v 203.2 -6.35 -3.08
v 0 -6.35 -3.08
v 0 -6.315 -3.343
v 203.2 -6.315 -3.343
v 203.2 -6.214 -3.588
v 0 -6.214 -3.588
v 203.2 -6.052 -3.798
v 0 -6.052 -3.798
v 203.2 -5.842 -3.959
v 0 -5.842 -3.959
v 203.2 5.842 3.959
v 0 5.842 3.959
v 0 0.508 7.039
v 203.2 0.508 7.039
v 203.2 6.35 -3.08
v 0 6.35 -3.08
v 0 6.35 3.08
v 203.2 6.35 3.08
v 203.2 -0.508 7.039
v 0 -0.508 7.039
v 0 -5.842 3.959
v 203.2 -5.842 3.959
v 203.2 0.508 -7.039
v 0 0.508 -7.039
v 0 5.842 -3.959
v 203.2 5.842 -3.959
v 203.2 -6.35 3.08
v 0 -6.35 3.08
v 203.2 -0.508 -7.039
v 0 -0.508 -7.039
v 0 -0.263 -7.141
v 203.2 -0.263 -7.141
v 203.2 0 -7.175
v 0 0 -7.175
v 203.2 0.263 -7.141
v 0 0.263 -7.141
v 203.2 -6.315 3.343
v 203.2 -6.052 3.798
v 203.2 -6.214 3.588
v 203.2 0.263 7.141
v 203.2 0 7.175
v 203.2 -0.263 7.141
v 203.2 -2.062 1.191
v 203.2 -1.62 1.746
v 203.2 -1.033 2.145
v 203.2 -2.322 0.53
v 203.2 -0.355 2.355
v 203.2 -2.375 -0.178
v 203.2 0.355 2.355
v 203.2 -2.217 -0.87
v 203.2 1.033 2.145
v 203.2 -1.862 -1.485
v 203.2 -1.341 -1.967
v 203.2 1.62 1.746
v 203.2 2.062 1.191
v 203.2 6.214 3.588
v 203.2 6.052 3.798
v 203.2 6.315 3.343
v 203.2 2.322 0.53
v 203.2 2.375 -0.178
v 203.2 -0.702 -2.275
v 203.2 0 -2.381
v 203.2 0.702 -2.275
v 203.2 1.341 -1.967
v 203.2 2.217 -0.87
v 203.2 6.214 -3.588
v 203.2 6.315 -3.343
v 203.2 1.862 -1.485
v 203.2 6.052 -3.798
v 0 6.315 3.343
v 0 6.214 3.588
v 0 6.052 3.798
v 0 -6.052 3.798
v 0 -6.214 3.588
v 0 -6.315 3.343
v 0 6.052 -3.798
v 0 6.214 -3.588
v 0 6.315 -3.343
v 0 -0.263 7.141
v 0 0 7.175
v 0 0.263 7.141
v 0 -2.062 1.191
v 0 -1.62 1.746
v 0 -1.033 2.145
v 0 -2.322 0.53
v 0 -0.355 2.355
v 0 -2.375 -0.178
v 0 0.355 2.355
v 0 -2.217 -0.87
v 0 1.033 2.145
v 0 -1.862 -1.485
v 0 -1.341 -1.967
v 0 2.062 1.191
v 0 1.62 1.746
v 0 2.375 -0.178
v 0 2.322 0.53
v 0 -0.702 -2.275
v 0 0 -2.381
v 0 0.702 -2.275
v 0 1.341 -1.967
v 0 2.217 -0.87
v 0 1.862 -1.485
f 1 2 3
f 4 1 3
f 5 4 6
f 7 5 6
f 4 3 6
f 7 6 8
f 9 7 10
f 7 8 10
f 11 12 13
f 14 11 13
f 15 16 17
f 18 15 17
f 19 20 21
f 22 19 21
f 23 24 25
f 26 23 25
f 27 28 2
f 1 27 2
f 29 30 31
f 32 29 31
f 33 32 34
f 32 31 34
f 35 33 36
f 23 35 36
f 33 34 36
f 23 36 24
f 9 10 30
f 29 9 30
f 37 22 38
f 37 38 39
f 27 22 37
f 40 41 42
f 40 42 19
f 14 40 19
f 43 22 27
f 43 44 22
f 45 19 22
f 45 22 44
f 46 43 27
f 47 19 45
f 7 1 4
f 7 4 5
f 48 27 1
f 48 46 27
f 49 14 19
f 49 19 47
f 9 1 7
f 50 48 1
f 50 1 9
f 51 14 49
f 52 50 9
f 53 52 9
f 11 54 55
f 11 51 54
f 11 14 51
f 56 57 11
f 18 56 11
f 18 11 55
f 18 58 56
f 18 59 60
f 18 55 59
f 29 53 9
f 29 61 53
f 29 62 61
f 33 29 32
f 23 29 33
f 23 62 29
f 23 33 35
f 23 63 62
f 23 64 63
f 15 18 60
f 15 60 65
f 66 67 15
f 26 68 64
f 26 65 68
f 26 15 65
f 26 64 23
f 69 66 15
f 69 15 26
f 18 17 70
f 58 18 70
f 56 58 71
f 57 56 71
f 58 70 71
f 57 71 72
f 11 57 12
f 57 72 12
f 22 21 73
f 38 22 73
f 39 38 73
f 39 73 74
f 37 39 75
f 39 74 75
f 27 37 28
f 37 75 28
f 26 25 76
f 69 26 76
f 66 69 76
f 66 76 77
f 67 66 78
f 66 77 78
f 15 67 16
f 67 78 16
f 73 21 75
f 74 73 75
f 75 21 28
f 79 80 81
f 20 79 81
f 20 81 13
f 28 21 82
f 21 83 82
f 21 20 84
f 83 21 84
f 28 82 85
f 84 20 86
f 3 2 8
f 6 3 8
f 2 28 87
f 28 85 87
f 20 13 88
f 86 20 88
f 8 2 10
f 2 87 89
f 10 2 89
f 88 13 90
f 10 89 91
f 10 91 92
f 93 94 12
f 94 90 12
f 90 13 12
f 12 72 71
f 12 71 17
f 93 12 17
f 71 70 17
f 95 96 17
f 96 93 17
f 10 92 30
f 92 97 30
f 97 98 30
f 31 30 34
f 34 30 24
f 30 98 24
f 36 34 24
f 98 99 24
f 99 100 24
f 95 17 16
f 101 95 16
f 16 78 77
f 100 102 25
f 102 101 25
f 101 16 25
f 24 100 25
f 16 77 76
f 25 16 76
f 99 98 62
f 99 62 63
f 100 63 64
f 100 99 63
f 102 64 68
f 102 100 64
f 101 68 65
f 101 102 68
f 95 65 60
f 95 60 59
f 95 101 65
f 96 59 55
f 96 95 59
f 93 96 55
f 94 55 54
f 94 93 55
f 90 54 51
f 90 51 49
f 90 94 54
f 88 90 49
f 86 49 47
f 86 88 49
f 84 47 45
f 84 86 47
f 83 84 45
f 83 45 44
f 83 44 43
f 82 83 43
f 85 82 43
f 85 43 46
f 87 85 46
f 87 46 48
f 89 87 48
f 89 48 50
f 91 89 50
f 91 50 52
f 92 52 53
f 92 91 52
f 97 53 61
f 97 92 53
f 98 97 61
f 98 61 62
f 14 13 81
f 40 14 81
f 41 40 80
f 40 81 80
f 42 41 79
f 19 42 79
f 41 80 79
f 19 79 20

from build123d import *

# Parameters (mm, degrees)
SKETCH1_R           = 2.38125
BOSS_EXTRUDE1_DEPTH = 203.2


with BuildPart() as part:
    # Sketch1 → Boss-Extrude1 (new body)
    with BuildSketch(Plane(origin=(0, 0, 0), x_dir=(0, 0, -1), z_dir=(1, 0, 0))):
        with BuildLine():
            Line((7.039054482, 0.508), (3.959468146, 5.842))
            ThreePointArc((3.959468146, 5.842), (3.587586336, 6.21388181), (3.079586336, 6.35))
            Line((3.079586336, 6.35), (-3.079586336, 6.35))
            ThreePointArc((-3.079586336, 6.35), (-3.587586336, 6.21388181), (-3.959468146, 5.842))
            Line((-3.959468146, 5.842), (-7.039054482, 0.508))
            ThreePointArc((-7.039054482, 0.508), (-7.175172672, 0), (-7.039054482, -0.508))
            Line((-7.039054482, -0.508), (-3.959468146, -5.842))
            ThreePointArc((-3.959468146, -5.842), (-3.587586336, -6.21388181), (-3.079586336, -6.35))
            Line((-3.079586336, -6.35), (3.079586336, -6.35))
            ThreePointArc((3.079586336, -6.35), (3.587586336, -6.21388181), (3.959468146, -5.842))
            Line((3.959468146, -5.842), (7.039054482, -0.508))
            ThreePointArc((7.039054482, -0.508), (7.175172672, 0), (7.039054482, 0.508))
        make_face()
        Circle(SKETCH1_R, mode=Mode.SUBTRACT)
    extrude(amount=BOSS_EXTRUDE1_DEPTH)


solid = part.part
